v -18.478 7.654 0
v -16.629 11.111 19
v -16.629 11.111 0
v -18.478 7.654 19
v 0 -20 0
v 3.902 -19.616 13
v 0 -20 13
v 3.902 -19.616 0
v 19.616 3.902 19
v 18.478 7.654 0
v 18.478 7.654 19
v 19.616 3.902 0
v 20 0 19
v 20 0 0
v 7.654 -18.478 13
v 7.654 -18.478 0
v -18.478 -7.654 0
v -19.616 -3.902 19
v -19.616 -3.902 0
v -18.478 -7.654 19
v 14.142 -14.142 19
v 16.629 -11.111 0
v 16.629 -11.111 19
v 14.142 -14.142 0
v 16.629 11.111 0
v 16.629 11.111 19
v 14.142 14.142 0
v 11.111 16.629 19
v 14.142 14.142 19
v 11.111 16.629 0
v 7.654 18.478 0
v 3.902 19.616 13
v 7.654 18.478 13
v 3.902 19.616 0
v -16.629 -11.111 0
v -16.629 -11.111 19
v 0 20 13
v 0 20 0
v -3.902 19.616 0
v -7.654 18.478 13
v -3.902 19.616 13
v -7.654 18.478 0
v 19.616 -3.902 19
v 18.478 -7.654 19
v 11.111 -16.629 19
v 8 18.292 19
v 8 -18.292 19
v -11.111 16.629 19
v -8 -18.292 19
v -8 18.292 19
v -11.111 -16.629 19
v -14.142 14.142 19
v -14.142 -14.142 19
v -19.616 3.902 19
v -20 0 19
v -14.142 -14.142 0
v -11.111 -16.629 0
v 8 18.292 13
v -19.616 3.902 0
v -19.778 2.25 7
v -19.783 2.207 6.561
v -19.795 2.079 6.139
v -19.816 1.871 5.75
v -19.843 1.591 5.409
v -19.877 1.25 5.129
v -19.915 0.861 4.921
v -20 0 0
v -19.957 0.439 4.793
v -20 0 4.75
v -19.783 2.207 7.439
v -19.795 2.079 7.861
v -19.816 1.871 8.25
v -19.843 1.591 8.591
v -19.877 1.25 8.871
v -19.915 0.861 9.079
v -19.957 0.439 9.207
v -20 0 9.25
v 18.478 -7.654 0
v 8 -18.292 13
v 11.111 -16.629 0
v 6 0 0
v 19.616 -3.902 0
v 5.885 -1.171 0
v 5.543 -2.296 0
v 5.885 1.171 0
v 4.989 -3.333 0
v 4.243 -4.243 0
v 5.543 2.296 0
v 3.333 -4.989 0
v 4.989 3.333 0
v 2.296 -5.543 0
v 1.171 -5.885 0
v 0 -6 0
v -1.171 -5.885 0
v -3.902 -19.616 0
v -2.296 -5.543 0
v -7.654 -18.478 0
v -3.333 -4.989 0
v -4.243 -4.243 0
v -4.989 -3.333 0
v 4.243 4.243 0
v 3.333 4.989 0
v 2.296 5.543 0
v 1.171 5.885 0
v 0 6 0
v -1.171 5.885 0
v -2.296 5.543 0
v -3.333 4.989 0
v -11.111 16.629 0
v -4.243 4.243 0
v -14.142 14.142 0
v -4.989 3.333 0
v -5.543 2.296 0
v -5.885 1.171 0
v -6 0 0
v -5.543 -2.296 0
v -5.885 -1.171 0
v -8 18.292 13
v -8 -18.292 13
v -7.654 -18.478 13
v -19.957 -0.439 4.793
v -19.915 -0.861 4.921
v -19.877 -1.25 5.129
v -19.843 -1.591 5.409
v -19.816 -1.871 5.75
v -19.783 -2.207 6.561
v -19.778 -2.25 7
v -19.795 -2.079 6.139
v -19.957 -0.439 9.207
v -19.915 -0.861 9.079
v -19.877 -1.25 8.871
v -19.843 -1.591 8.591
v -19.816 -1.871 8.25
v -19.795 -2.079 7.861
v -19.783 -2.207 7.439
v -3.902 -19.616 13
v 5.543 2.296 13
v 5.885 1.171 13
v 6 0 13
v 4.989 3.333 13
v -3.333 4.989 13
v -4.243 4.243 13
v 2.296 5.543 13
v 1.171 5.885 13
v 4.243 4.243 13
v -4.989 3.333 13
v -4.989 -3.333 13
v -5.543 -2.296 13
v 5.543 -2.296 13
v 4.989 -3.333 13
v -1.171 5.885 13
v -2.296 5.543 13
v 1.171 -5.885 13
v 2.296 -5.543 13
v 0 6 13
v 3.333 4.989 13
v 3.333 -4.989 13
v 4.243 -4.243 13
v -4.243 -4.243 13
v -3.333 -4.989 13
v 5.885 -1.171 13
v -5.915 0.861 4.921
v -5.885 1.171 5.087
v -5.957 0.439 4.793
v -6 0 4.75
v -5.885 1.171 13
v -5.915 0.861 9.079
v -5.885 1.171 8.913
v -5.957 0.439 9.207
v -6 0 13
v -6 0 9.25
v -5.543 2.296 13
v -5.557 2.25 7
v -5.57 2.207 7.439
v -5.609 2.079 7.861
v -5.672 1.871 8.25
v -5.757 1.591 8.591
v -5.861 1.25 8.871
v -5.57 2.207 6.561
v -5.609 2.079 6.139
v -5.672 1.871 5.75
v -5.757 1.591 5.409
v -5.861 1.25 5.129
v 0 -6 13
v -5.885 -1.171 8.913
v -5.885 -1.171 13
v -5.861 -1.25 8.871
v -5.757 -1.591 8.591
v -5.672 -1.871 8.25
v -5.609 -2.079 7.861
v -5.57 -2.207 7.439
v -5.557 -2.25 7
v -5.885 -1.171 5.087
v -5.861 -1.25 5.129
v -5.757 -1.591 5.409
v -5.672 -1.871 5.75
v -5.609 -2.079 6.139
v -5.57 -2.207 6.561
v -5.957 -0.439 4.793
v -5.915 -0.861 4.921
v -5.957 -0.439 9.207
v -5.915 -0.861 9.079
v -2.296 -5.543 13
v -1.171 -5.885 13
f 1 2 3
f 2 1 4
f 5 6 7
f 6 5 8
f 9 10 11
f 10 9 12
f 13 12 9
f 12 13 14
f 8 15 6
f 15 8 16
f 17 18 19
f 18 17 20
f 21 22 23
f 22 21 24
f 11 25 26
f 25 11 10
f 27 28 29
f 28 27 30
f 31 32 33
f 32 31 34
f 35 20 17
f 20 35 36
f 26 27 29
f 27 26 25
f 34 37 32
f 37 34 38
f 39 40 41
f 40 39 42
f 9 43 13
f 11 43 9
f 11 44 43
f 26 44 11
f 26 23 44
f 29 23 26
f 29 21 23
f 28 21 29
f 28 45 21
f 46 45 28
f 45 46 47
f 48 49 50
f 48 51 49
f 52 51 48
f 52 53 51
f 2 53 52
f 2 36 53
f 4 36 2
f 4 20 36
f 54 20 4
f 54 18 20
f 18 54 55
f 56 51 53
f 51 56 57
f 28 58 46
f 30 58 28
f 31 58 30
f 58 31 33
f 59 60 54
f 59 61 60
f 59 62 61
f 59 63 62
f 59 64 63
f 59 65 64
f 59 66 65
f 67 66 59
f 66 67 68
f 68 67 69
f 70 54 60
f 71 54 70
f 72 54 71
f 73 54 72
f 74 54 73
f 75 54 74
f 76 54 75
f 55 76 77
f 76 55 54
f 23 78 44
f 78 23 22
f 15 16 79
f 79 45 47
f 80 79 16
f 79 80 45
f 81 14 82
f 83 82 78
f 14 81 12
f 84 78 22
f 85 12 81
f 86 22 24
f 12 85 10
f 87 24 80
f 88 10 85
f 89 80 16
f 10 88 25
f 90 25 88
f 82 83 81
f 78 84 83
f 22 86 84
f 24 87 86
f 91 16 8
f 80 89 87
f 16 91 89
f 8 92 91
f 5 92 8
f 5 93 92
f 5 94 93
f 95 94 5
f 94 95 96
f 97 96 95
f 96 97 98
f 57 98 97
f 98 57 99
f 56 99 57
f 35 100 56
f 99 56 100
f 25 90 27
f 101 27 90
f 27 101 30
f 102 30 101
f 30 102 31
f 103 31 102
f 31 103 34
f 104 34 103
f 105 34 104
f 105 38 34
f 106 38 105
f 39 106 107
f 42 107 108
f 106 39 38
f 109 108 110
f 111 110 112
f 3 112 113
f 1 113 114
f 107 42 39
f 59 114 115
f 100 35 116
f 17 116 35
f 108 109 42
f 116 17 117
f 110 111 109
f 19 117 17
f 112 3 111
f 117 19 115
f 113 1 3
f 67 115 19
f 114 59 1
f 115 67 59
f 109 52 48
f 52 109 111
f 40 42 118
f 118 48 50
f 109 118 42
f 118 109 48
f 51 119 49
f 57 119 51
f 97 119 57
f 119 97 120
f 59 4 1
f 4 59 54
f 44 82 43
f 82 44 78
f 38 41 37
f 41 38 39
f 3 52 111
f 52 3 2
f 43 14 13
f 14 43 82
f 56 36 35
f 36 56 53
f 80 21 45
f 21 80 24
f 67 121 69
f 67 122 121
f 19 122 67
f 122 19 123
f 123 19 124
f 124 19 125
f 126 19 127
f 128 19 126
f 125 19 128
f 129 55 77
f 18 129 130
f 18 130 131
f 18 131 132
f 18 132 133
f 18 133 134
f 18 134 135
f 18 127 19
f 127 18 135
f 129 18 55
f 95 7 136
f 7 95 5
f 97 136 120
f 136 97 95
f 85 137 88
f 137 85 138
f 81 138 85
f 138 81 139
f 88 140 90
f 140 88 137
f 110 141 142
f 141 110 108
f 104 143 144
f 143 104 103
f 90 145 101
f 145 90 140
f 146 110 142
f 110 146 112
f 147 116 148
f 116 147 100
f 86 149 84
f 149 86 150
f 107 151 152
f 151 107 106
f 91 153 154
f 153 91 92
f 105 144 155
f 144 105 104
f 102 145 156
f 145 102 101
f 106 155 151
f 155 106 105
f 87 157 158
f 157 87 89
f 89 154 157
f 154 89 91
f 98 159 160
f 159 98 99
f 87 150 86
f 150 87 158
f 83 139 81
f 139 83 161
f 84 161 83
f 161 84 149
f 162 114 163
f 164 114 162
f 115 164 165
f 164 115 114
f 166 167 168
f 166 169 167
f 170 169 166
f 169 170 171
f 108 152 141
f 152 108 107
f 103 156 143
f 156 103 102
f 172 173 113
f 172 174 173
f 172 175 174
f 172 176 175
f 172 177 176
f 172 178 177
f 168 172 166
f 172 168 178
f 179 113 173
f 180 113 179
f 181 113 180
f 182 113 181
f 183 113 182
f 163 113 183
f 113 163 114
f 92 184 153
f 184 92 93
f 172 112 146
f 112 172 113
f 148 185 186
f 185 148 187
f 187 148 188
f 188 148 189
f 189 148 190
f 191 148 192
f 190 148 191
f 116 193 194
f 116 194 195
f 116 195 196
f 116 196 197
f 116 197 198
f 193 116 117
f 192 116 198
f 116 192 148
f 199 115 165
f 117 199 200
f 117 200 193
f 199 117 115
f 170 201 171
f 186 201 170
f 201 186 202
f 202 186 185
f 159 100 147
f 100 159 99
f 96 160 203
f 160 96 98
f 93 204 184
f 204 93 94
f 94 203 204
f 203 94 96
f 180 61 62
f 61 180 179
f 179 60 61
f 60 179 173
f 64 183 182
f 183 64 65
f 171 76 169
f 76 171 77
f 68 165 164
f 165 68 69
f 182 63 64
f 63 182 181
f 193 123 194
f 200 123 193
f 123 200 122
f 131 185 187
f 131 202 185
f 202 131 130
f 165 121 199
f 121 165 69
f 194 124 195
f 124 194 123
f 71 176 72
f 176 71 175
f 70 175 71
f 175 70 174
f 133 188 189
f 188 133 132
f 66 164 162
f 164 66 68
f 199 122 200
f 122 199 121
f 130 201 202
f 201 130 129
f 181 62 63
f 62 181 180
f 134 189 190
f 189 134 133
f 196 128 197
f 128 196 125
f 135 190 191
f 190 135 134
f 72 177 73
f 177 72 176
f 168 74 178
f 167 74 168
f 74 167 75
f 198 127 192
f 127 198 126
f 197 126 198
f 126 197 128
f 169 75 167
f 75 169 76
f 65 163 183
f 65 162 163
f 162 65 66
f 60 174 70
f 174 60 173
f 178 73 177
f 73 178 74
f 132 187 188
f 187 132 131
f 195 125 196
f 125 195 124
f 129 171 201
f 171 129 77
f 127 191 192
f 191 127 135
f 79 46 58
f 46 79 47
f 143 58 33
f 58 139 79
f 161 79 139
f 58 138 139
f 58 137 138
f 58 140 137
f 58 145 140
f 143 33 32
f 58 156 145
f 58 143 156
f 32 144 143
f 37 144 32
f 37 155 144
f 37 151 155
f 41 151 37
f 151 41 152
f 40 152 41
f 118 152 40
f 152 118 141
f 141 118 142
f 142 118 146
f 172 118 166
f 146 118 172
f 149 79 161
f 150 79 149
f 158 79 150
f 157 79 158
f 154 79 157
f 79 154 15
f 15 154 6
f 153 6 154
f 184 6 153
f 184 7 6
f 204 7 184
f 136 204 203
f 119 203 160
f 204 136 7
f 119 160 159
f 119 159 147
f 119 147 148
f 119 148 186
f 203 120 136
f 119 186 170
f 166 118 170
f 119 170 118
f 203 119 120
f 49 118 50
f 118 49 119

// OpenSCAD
$fn = 32;

// ----------------------------------------------------------------------
// Oldham coupling hub: 40 x 19 mm
// ----------------------------------------------------------------------

// --- parameters (mm) ---
body_d = 40;              // hub diameter
body_l = 14;              // hub length
shaft_d = 12;             // shaft bore
cam_w = 16;               // drive tongue width
tongue_h = 5;             // drive tongue height
set_d = 4.5;              // set screw tap hole

module hub() {
  /* the slot side is a raised disc with a groove milled across it */
  cylinder(h = body_l + tongue_h, d = body_d);
}

difference() {
  hub();
  translate([0, 0, -1]) cylinder(h = body_l + tongue_h + 2, d = shaft_d);
  translate([-body_d / 2 - 1, 0, body_l * 0.5])
    rotate([0, 90, 0]) cylinder(h = body_d / 2 + 2, d = set_d);
  translate([-cam_w / 2, -body_d / 2 - 1, body_l - 1])
    cube([cam_w, body_d + 2, tongue_h + 1]);
}
